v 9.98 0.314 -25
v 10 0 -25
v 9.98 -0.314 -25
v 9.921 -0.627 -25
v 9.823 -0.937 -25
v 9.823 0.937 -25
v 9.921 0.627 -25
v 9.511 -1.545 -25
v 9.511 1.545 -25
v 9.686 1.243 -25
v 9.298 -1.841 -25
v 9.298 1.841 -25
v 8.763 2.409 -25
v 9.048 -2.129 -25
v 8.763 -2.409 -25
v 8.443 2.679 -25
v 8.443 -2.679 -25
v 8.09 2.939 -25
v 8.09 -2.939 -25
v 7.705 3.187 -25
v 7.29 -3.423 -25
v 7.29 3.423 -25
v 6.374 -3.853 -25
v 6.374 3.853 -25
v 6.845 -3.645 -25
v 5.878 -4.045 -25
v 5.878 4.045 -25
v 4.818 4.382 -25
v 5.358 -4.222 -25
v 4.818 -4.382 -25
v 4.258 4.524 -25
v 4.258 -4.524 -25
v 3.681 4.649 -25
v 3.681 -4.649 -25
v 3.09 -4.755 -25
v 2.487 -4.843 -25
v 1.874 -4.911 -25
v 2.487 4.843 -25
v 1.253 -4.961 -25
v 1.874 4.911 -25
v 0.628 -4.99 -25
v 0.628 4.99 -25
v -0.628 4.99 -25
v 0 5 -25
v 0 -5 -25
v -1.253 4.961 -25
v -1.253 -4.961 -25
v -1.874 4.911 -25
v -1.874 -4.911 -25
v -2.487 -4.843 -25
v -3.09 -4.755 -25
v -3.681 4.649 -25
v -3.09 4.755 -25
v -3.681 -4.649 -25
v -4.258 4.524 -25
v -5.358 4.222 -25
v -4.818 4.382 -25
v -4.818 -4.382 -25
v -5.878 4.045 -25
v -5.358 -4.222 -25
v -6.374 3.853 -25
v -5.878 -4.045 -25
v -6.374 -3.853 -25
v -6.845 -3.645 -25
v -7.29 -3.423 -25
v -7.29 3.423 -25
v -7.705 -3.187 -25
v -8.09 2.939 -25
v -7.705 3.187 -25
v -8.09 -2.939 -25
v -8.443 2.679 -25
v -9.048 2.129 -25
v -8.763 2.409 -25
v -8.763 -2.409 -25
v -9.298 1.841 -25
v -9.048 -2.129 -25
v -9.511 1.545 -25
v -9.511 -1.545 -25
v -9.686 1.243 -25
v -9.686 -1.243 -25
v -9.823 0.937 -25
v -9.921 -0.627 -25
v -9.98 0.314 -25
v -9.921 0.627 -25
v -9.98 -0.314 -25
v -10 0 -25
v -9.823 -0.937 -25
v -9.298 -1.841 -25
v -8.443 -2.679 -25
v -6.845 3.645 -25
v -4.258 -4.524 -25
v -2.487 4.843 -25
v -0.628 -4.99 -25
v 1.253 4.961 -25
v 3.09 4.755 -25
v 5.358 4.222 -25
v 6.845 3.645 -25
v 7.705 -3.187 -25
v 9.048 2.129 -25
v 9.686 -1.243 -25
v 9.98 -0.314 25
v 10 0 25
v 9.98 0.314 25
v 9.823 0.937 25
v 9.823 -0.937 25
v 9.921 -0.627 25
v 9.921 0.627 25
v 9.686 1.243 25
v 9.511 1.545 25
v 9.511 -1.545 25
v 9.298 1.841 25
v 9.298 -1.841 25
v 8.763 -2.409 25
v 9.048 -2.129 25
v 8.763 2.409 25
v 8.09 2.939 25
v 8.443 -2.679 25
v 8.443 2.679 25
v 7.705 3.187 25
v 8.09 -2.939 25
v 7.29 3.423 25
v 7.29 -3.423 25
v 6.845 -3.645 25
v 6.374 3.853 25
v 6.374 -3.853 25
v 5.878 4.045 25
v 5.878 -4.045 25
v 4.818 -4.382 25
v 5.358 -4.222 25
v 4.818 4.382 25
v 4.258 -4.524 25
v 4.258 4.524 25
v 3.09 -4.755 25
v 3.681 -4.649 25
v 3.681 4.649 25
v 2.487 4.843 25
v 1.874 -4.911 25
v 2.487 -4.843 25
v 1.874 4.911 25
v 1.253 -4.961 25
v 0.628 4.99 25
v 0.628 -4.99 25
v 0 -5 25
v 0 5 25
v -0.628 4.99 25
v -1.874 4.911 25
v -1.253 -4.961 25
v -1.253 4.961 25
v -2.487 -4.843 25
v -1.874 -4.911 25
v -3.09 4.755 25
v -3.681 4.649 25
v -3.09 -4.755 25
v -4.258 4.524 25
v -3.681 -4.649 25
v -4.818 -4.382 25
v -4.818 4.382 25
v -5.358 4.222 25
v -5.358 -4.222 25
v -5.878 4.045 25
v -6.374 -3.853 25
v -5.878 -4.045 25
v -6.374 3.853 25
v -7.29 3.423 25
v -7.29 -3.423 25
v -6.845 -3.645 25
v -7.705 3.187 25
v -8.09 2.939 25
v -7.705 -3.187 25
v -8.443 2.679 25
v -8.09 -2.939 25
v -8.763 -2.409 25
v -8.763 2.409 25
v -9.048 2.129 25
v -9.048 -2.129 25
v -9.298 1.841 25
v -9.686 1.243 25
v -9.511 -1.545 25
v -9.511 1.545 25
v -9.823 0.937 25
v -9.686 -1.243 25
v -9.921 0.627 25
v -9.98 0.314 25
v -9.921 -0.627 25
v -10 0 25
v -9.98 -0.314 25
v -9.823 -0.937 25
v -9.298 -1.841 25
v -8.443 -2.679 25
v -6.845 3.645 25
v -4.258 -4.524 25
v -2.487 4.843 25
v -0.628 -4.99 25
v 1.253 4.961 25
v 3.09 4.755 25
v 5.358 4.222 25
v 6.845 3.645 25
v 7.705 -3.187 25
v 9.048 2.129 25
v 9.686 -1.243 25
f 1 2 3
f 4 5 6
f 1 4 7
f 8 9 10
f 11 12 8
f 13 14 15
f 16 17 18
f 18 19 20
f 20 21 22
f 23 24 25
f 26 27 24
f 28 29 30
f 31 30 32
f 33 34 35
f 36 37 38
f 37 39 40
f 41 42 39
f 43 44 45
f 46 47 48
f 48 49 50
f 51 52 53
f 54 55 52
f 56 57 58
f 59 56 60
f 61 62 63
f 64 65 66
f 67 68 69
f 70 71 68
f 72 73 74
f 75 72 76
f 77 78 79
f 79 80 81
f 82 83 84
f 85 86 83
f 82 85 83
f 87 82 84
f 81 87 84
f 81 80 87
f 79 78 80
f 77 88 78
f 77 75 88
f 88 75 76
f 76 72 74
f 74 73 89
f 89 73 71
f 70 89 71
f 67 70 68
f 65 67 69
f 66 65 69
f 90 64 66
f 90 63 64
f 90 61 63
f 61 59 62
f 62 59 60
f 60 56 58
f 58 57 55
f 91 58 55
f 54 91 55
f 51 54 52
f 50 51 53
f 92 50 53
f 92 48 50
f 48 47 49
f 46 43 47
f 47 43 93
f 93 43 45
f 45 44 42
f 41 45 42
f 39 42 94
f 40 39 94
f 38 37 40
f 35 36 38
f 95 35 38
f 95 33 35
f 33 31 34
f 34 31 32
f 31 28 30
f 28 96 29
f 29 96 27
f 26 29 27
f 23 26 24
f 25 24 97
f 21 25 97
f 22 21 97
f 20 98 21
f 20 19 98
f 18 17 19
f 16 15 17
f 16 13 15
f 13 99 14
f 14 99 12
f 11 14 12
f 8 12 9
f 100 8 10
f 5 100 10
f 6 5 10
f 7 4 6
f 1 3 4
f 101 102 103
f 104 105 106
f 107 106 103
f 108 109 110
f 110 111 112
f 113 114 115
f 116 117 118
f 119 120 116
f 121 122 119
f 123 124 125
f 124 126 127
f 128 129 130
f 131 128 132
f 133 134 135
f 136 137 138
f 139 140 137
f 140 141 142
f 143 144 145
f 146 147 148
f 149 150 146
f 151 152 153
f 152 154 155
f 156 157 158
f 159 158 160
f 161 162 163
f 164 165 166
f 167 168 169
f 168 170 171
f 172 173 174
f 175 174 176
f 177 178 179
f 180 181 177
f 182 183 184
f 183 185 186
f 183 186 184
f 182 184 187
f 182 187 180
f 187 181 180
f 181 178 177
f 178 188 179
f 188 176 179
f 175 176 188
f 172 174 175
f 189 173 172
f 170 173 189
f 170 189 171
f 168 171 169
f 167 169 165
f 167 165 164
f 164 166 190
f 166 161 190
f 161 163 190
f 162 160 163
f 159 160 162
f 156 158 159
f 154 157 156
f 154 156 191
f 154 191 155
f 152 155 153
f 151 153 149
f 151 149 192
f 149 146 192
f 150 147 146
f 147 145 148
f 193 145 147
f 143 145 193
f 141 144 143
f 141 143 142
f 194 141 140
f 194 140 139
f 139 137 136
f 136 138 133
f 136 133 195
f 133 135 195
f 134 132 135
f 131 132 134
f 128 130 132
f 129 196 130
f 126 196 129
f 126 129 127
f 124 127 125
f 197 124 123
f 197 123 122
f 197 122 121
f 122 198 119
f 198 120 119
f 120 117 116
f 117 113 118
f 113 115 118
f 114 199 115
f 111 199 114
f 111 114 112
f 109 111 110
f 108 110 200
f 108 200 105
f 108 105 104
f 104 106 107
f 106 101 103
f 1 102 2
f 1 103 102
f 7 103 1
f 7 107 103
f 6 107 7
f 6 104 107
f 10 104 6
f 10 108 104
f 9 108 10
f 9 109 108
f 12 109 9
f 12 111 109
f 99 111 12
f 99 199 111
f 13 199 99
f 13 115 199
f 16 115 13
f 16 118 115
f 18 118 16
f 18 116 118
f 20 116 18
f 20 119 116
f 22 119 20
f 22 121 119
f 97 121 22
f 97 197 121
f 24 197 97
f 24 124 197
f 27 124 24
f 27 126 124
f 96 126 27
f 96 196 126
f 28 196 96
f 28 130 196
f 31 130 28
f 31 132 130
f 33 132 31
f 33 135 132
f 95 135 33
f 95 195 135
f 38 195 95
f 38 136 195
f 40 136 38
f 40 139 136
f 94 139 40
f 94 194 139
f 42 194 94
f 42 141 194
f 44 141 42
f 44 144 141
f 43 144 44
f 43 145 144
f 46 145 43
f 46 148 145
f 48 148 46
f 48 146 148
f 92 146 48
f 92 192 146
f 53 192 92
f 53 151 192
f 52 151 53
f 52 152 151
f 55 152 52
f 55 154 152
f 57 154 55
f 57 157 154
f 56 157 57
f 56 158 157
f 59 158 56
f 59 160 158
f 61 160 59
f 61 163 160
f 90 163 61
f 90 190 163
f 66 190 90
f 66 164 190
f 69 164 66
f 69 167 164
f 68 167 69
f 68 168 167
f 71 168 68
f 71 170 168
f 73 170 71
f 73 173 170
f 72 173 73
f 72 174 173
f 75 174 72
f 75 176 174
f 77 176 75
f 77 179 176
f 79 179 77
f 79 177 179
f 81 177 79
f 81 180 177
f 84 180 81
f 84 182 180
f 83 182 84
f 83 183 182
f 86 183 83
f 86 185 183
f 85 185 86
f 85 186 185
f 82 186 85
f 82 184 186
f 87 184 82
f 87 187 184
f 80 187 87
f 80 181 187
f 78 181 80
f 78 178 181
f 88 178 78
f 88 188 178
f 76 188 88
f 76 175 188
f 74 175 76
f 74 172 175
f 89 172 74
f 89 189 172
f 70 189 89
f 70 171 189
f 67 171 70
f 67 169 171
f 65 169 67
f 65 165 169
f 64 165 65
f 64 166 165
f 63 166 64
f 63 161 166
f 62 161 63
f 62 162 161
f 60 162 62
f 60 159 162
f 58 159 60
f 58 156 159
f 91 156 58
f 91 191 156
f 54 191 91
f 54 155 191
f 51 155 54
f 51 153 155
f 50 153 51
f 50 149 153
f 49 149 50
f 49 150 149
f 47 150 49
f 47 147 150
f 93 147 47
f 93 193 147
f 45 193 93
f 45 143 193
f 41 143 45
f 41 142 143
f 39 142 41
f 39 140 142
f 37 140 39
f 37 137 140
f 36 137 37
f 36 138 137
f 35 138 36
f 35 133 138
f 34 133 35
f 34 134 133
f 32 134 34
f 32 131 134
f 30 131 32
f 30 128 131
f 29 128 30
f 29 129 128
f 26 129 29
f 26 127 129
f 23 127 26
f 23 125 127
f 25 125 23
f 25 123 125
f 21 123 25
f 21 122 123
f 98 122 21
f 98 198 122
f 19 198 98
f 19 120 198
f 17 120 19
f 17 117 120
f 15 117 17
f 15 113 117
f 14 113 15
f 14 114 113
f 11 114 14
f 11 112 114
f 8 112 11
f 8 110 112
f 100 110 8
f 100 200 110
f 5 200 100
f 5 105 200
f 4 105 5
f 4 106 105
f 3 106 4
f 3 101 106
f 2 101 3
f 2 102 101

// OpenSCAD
$fn = 100;

linear_extrude(height=50,center=true)
    scale([2,1,1])
        circle(d=10);
